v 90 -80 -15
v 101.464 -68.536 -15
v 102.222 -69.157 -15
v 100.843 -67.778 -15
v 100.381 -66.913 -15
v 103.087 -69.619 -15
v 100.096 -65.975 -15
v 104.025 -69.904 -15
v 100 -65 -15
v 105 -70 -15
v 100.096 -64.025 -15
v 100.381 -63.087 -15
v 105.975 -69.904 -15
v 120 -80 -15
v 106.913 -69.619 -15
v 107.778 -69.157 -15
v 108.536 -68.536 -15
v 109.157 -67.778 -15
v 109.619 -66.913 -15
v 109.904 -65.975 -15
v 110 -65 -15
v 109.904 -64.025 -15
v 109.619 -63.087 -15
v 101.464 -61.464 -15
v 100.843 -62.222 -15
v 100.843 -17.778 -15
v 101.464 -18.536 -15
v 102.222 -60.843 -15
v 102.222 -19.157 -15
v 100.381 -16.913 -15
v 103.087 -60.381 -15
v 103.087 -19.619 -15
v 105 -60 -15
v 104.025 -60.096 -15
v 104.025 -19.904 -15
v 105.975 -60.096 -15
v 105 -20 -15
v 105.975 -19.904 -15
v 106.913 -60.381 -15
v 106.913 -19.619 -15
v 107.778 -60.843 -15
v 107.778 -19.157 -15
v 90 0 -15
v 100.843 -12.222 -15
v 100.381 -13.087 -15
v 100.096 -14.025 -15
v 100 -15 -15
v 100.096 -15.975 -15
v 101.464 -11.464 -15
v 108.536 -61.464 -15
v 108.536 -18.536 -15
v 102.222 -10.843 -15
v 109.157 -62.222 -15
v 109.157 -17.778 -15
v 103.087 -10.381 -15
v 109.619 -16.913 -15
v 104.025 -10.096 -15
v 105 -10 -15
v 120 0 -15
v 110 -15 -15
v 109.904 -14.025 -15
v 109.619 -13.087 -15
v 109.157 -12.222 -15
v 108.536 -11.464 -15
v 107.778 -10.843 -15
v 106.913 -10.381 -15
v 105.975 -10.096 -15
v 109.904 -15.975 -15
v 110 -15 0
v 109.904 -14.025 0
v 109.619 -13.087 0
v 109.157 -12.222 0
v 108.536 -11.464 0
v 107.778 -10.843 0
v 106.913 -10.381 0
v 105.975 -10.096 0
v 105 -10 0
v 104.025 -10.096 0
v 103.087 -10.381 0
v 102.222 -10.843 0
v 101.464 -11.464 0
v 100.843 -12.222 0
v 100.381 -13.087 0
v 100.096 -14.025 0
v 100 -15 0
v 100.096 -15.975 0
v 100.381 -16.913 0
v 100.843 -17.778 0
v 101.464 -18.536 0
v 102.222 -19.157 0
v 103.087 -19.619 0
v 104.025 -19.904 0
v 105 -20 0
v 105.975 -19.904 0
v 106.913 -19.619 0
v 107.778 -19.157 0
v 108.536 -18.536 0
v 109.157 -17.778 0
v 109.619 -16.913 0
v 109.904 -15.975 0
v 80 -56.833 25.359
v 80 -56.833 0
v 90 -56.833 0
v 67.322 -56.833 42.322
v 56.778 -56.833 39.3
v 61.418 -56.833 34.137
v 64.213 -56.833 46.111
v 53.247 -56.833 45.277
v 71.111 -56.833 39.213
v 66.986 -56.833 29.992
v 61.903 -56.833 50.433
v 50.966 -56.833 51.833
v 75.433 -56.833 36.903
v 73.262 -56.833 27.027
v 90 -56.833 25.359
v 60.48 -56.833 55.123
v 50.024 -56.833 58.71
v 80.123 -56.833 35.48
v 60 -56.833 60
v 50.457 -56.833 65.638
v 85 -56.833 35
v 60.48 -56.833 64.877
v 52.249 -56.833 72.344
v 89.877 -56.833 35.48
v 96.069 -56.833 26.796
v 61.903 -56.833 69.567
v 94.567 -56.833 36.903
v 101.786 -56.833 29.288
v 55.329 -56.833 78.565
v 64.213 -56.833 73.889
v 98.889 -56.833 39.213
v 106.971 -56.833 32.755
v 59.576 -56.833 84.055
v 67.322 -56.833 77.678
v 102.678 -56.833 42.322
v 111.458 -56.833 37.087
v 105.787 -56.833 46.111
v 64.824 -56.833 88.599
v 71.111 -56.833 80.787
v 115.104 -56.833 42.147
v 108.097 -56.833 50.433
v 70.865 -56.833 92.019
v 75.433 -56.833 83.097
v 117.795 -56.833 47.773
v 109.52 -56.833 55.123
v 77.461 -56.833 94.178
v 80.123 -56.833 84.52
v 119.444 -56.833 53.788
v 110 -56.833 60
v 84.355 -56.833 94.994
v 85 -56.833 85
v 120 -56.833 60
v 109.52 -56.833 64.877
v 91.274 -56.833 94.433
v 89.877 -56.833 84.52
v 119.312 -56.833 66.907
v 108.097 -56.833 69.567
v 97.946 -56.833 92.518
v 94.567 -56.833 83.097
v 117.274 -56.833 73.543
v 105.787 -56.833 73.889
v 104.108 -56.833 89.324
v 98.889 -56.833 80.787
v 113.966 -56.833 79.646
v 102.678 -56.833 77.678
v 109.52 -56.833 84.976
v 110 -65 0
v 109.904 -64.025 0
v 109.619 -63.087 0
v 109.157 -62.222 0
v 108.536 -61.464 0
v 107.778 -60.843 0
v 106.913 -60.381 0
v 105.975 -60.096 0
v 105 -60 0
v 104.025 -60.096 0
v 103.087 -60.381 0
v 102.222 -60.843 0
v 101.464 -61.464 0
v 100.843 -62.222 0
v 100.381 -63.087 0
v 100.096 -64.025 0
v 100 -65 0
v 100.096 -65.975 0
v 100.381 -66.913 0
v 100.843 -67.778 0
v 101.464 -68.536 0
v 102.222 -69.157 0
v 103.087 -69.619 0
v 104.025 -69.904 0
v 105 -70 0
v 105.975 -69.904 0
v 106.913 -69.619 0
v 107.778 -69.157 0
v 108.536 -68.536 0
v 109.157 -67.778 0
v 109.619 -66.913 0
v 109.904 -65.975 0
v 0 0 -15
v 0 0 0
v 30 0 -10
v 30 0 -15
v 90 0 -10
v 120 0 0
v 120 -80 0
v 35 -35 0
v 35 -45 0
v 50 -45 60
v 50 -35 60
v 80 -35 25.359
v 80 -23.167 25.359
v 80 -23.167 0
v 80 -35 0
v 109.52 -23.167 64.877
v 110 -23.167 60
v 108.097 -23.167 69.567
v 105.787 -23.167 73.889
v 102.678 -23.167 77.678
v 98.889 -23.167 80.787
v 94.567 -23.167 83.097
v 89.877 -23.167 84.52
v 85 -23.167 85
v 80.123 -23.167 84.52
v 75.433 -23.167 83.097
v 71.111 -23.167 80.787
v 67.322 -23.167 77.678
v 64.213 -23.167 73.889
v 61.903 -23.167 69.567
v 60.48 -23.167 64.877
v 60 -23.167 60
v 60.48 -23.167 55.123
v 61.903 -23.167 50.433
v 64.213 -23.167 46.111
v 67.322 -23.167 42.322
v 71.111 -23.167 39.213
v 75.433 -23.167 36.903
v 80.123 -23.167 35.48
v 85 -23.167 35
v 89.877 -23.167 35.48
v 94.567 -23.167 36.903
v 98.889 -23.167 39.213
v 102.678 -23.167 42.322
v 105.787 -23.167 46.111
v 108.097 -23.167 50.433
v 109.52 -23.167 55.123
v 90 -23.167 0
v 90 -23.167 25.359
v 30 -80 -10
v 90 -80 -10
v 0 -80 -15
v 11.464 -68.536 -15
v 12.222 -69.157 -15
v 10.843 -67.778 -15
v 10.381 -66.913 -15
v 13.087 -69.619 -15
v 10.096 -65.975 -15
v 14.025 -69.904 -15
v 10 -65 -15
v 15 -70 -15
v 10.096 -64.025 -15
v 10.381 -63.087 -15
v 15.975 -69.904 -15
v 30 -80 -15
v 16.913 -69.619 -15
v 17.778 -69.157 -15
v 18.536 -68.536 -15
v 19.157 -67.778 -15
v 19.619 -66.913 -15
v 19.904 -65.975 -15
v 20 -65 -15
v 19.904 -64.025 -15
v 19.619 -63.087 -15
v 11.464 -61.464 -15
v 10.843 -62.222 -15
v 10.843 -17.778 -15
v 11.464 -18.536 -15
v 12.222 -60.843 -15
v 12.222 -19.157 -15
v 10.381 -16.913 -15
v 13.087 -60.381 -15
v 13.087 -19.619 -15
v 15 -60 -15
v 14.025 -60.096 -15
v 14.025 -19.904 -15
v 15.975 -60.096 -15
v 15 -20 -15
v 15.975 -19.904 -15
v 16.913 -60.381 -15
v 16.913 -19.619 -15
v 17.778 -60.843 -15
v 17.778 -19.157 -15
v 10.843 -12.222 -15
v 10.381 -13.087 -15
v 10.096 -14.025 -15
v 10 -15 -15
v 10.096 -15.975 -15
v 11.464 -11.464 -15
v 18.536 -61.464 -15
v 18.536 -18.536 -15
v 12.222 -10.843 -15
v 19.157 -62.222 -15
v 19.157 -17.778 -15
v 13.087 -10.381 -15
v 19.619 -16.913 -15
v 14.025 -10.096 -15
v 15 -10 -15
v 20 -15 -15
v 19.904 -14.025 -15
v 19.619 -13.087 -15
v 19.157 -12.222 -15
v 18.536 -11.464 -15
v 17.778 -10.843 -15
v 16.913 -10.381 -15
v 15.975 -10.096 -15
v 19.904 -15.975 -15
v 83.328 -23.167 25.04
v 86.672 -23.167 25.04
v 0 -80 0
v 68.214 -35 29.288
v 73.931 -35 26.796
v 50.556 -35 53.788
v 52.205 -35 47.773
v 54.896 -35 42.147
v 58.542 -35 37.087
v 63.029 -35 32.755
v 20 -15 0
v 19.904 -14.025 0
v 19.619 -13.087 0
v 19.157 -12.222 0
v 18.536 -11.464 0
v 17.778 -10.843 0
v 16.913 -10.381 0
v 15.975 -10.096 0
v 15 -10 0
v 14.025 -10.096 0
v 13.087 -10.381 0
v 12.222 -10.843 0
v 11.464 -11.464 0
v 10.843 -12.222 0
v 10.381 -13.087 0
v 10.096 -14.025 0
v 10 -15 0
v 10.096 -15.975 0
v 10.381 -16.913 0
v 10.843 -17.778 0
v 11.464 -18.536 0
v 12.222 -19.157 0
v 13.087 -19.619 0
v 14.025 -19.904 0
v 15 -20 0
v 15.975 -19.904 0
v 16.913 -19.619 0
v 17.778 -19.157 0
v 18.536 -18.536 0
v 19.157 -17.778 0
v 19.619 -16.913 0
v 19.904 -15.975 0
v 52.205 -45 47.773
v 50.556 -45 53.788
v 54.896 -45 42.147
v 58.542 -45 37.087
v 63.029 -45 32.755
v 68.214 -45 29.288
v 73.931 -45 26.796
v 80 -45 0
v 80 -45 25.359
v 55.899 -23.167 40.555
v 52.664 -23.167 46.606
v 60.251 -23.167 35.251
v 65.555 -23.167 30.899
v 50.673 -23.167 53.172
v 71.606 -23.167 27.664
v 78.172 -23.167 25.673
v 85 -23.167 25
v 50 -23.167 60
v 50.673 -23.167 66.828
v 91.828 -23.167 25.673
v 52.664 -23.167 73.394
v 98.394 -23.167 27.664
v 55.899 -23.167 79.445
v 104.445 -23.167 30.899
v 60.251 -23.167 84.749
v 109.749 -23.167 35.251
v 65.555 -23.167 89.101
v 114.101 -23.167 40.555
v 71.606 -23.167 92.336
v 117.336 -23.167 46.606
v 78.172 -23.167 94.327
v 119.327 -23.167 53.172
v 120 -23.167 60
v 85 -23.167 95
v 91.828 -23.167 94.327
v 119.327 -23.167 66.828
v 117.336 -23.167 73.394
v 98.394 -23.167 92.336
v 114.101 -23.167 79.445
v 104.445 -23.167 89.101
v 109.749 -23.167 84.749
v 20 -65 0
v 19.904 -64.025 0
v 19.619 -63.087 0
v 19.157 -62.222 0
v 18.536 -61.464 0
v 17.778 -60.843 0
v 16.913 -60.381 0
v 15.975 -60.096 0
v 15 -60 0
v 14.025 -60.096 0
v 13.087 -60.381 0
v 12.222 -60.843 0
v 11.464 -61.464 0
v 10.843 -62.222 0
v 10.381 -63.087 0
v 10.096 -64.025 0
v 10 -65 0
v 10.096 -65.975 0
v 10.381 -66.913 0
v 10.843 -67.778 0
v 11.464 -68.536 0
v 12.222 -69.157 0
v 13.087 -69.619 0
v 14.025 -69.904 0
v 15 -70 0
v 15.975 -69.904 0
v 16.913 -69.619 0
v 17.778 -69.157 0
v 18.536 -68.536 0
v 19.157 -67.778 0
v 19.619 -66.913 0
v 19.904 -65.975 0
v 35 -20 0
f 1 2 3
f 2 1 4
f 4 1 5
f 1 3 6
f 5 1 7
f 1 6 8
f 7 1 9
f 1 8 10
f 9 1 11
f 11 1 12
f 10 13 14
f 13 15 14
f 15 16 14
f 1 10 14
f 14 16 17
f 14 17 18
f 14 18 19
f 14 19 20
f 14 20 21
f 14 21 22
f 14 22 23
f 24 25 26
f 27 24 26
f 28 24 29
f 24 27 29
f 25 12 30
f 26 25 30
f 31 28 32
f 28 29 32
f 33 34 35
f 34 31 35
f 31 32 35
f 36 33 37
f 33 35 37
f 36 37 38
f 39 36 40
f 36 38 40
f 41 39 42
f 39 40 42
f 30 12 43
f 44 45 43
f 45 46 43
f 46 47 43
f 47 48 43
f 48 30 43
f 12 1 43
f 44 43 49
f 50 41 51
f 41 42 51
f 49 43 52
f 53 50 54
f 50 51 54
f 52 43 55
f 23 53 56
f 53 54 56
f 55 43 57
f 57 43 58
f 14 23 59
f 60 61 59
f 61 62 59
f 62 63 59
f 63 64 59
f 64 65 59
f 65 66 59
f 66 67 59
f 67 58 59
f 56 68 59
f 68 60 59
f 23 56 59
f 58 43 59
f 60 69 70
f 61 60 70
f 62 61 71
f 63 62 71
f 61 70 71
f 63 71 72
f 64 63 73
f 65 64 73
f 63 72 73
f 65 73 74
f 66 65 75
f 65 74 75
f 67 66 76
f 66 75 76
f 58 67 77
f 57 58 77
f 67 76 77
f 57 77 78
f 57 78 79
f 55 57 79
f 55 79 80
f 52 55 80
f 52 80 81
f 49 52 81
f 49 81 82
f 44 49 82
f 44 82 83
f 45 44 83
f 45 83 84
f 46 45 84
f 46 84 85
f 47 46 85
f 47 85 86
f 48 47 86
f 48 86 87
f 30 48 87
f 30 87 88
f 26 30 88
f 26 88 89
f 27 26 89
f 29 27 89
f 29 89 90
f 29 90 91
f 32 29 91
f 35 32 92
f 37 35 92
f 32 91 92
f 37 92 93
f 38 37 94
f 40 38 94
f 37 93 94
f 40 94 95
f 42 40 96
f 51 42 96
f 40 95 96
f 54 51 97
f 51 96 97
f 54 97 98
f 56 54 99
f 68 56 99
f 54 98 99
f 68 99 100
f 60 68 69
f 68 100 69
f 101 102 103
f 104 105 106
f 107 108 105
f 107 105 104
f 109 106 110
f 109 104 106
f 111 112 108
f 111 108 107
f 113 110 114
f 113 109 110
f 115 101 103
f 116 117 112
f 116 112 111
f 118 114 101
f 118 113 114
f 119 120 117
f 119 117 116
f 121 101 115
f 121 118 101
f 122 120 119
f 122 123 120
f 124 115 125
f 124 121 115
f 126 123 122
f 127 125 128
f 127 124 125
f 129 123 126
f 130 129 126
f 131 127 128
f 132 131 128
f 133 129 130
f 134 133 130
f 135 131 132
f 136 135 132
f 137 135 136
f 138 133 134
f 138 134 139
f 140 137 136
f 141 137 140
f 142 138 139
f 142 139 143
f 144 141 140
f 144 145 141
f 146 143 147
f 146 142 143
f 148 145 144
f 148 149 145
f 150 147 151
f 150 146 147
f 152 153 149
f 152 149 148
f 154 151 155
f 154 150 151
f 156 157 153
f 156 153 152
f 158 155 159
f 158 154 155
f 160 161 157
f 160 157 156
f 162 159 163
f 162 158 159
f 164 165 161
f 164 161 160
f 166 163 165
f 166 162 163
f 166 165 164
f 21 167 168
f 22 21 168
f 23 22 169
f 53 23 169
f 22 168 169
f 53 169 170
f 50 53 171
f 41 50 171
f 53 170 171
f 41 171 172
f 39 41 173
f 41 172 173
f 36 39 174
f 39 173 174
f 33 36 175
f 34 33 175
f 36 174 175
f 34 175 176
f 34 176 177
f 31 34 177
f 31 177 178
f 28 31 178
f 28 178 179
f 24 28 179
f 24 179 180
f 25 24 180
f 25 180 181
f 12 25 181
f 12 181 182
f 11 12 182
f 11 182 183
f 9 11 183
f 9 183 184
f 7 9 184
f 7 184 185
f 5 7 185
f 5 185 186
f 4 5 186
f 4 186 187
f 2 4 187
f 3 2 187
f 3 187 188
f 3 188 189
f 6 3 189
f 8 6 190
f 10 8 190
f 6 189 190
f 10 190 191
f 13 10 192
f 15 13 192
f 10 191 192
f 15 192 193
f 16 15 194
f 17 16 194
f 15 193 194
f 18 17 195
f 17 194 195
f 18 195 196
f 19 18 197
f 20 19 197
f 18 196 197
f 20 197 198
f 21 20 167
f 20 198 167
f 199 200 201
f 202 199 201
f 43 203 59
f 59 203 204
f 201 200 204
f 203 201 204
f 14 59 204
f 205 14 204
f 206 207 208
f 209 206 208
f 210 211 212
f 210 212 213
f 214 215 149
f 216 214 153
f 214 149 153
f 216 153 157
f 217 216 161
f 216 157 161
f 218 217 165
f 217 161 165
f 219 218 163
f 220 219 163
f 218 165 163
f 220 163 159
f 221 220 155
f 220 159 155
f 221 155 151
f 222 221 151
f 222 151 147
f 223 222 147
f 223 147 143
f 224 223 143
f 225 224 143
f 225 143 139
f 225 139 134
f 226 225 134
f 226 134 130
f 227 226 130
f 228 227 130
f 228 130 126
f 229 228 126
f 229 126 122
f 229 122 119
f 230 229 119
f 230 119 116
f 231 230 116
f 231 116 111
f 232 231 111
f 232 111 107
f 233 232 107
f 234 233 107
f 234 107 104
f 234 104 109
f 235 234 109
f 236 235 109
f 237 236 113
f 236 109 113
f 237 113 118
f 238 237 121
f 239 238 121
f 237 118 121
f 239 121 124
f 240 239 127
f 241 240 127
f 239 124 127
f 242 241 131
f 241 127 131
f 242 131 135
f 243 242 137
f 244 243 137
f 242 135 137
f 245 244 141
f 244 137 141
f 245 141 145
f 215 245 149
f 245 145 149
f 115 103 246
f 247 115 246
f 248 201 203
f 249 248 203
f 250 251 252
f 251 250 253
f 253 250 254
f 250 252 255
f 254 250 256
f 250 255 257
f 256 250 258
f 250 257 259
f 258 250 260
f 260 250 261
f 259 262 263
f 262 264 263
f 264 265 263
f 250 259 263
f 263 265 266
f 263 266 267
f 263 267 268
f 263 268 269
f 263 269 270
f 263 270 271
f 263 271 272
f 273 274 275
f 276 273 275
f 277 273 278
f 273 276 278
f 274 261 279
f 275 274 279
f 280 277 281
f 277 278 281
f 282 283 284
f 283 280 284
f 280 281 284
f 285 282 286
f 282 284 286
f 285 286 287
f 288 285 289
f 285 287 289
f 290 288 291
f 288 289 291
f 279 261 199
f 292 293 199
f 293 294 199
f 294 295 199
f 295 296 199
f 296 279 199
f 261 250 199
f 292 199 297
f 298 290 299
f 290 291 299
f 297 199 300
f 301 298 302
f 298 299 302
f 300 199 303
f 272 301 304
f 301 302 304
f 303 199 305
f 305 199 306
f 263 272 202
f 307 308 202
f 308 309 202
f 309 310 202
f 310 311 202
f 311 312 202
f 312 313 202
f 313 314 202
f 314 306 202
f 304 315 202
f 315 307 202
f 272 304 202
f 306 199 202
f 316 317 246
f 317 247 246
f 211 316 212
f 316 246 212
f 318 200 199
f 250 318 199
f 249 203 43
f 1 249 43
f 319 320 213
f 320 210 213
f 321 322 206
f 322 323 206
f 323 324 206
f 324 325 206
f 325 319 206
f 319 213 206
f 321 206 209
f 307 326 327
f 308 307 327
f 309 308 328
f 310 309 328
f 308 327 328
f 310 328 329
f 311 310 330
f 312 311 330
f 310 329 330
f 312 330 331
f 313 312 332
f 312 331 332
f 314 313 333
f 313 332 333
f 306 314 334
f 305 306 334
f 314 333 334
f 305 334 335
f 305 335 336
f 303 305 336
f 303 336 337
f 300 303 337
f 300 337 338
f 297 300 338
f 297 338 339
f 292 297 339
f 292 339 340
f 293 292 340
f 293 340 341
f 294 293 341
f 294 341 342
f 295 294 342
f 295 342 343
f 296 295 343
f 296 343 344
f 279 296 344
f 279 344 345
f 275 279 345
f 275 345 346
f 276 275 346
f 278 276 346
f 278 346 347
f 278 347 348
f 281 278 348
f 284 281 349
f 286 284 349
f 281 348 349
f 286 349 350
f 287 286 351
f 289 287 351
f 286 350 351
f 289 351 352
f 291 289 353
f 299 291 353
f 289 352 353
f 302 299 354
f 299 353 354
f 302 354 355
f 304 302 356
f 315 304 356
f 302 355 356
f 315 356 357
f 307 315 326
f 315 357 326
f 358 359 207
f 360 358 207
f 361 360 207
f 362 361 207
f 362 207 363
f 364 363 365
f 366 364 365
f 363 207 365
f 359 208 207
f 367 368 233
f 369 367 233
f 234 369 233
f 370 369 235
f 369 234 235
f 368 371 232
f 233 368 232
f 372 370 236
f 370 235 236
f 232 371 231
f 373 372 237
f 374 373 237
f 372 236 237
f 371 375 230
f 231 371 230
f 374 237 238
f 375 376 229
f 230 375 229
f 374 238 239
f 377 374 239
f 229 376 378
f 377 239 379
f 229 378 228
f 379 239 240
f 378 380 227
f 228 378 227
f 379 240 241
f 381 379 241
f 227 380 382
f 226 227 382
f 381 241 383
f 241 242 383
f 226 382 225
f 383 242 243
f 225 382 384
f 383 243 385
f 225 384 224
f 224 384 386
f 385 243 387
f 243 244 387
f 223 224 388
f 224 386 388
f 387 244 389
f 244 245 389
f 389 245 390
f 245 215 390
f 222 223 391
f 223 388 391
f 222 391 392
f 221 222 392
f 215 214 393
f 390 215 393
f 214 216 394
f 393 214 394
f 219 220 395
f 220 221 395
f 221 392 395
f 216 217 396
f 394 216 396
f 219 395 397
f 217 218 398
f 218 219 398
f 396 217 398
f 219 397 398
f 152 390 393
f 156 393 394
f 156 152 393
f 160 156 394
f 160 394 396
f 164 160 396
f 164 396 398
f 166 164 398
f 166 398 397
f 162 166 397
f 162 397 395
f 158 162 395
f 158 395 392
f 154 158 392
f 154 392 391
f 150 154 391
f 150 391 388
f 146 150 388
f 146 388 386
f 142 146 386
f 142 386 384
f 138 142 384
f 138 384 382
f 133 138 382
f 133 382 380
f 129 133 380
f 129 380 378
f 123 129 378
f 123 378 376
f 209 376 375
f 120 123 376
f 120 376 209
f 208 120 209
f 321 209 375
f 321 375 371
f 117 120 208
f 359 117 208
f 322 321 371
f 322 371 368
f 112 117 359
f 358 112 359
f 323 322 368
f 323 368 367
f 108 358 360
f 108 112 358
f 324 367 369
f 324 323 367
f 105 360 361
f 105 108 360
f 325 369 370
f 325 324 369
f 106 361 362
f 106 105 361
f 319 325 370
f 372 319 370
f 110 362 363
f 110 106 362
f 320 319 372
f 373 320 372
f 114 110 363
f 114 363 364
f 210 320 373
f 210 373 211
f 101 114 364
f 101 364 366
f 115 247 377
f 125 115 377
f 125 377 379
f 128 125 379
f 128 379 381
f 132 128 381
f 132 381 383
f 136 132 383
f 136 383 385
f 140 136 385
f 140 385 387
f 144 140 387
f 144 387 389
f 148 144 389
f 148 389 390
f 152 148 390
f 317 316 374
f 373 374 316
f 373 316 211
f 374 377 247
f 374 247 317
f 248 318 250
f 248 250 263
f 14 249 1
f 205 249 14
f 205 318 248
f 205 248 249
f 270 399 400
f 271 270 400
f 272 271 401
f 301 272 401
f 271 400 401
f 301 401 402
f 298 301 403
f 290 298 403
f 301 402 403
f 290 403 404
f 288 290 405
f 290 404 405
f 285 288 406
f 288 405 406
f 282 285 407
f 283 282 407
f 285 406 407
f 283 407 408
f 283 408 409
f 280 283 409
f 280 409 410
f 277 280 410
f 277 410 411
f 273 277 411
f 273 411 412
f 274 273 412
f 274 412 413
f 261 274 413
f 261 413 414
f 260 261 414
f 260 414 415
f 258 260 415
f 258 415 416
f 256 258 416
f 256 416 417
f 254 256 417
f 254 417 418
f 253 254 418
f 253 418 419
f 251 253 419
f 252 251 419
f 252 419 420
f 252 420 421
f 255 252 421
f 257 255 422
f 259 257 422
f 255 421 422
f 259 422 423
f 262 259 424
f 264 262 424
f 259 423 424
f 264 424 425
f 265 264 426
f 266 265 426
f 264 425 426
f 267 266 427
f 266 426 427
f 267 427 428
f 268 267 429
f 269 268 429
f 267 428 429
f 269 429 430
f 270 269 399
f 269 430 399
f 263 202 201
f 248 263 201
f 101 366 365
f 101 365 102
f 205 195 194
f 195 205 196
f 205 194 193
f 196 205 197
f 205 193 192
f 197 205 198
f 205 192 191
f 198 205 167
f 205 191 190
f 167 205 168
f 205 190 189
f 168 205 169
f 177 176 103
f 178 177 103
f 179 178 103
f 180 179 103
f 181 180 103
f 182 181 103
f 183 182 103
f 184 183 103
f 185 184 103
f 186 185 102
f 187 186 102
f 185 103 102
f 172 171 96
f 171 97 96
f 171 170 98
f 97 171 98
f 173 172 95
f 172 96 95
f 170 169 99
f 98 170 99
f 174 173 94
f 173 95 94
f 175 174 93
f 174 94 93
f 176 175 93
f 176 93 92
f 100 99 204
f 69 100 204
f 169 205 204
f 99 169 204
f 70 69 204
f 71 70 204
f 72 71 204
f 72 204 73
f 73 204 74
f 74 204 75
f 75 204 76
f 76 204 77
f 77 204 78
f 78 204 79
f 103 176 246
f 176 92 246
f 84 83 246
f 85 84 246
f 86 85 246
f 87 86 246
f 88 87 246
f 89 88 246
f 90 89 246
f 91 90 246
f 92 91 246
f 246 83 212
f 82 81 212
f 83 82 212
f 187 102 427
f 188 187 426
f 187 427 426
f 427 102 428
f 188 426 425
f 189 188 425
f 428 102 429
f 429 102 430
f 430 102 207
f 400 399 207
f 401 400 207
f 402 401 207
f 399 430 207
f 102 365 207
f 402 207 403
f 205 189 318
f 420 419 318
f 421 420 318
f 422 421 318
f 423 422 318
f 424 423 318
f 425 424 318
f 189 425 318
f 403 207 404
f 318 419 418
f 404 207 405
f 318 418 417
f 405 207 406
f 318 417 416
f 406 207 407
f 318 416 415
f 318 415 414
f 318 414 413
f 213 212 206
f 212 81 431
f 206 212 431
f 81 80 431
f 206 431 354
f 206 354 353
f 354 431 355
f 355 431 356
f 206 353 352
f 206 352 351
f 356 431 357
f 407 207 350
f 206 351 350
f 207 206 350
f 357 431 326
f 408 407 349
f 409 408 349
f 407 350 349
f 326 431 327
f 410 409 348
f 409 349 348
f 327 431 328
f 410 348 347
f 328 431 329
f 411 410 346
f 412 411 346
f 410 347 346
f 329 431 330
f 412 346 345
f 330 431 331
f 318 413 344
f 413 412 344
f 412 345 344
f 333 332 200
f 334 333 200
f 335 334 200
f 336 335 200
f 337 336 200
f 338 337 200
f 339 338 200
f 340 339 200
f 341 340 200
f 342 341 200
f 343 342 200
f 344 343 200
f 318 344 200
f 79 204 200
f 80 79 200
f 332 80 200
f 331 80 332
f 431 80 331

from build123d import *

# Parameters (mm, degrees)
F1_DEPTH  = 80
F2_R      = 5
F3_DEPTH  = 25
F5_DEPTH  = 60
F6_R      = 35
F7_DEPTH  = 33.666907
F8_R      = 25
F9_DEPTH  = 52.6
F11_DEPTH = 25


with BuildPart() as f1:
    # F0 (on Front) → F1 (new body)
    with BuildSketch(Plane.XZ):
        Polygon((120, 0), (0, 0), (0, -15), (30, -15), (30, -10), (90, -10), (90, -15), (120, -15), align=None)
    extrude(amount=F1_DEPTH)

    # F2 (on face) → F3 (cut)
    with BuildSketch(Plane.XY):
        with Locations((15, -15)):
            Circle(F2_R)
        with Locations((15, -65)):
            Circle(F2_R)
        with Locations((105, -65)):
            Circle(F2_R)
        with Locations((105, -15)):
            Circle(F2_R)
    extrude(amount=-F3_DEPTH, mode=Mode.SUBTRACT)

    # F4 (on face) → F5 (join)
    with BuildSketch(Plane.XY):
        Polygon((35, -45), (80, -45), (80, -56.833453), (90, -56.833453), (90, -45), (90, -35), (90, -23.166547), (80, -23.166547), (80, -35), (35, -35), align=None)
    extrude(amount=F5_DEPTH)

    # F6 (on face) → F7 (join, through all)
    with BuildSketch(Plane.XZ.offset(56.833453)):
        with Locations((85, 60)):
            Circle(F6_R)
    extrude(amount=-F7_DEPTH)

    # F8 (on face) → F9 (cut)
    with BuildSketch(Plane.XZ.offset(56.833453)):
        with Locations((85, 60)):
            Circle(F8_R)
    extrude(amount=-F9_DEPTH, mode=Mode.SUBTRACT)

    # F10 (on face) → F11 (cut)
    with BuildSketch(Plane.XZ.offset(45)):
        Polygon((35, 60), (35, 0), (50, 60), align=None)
    extrude(amount=-F11_DEPTH, mode=Mode.SUBTRACT)


solid = f1.part
